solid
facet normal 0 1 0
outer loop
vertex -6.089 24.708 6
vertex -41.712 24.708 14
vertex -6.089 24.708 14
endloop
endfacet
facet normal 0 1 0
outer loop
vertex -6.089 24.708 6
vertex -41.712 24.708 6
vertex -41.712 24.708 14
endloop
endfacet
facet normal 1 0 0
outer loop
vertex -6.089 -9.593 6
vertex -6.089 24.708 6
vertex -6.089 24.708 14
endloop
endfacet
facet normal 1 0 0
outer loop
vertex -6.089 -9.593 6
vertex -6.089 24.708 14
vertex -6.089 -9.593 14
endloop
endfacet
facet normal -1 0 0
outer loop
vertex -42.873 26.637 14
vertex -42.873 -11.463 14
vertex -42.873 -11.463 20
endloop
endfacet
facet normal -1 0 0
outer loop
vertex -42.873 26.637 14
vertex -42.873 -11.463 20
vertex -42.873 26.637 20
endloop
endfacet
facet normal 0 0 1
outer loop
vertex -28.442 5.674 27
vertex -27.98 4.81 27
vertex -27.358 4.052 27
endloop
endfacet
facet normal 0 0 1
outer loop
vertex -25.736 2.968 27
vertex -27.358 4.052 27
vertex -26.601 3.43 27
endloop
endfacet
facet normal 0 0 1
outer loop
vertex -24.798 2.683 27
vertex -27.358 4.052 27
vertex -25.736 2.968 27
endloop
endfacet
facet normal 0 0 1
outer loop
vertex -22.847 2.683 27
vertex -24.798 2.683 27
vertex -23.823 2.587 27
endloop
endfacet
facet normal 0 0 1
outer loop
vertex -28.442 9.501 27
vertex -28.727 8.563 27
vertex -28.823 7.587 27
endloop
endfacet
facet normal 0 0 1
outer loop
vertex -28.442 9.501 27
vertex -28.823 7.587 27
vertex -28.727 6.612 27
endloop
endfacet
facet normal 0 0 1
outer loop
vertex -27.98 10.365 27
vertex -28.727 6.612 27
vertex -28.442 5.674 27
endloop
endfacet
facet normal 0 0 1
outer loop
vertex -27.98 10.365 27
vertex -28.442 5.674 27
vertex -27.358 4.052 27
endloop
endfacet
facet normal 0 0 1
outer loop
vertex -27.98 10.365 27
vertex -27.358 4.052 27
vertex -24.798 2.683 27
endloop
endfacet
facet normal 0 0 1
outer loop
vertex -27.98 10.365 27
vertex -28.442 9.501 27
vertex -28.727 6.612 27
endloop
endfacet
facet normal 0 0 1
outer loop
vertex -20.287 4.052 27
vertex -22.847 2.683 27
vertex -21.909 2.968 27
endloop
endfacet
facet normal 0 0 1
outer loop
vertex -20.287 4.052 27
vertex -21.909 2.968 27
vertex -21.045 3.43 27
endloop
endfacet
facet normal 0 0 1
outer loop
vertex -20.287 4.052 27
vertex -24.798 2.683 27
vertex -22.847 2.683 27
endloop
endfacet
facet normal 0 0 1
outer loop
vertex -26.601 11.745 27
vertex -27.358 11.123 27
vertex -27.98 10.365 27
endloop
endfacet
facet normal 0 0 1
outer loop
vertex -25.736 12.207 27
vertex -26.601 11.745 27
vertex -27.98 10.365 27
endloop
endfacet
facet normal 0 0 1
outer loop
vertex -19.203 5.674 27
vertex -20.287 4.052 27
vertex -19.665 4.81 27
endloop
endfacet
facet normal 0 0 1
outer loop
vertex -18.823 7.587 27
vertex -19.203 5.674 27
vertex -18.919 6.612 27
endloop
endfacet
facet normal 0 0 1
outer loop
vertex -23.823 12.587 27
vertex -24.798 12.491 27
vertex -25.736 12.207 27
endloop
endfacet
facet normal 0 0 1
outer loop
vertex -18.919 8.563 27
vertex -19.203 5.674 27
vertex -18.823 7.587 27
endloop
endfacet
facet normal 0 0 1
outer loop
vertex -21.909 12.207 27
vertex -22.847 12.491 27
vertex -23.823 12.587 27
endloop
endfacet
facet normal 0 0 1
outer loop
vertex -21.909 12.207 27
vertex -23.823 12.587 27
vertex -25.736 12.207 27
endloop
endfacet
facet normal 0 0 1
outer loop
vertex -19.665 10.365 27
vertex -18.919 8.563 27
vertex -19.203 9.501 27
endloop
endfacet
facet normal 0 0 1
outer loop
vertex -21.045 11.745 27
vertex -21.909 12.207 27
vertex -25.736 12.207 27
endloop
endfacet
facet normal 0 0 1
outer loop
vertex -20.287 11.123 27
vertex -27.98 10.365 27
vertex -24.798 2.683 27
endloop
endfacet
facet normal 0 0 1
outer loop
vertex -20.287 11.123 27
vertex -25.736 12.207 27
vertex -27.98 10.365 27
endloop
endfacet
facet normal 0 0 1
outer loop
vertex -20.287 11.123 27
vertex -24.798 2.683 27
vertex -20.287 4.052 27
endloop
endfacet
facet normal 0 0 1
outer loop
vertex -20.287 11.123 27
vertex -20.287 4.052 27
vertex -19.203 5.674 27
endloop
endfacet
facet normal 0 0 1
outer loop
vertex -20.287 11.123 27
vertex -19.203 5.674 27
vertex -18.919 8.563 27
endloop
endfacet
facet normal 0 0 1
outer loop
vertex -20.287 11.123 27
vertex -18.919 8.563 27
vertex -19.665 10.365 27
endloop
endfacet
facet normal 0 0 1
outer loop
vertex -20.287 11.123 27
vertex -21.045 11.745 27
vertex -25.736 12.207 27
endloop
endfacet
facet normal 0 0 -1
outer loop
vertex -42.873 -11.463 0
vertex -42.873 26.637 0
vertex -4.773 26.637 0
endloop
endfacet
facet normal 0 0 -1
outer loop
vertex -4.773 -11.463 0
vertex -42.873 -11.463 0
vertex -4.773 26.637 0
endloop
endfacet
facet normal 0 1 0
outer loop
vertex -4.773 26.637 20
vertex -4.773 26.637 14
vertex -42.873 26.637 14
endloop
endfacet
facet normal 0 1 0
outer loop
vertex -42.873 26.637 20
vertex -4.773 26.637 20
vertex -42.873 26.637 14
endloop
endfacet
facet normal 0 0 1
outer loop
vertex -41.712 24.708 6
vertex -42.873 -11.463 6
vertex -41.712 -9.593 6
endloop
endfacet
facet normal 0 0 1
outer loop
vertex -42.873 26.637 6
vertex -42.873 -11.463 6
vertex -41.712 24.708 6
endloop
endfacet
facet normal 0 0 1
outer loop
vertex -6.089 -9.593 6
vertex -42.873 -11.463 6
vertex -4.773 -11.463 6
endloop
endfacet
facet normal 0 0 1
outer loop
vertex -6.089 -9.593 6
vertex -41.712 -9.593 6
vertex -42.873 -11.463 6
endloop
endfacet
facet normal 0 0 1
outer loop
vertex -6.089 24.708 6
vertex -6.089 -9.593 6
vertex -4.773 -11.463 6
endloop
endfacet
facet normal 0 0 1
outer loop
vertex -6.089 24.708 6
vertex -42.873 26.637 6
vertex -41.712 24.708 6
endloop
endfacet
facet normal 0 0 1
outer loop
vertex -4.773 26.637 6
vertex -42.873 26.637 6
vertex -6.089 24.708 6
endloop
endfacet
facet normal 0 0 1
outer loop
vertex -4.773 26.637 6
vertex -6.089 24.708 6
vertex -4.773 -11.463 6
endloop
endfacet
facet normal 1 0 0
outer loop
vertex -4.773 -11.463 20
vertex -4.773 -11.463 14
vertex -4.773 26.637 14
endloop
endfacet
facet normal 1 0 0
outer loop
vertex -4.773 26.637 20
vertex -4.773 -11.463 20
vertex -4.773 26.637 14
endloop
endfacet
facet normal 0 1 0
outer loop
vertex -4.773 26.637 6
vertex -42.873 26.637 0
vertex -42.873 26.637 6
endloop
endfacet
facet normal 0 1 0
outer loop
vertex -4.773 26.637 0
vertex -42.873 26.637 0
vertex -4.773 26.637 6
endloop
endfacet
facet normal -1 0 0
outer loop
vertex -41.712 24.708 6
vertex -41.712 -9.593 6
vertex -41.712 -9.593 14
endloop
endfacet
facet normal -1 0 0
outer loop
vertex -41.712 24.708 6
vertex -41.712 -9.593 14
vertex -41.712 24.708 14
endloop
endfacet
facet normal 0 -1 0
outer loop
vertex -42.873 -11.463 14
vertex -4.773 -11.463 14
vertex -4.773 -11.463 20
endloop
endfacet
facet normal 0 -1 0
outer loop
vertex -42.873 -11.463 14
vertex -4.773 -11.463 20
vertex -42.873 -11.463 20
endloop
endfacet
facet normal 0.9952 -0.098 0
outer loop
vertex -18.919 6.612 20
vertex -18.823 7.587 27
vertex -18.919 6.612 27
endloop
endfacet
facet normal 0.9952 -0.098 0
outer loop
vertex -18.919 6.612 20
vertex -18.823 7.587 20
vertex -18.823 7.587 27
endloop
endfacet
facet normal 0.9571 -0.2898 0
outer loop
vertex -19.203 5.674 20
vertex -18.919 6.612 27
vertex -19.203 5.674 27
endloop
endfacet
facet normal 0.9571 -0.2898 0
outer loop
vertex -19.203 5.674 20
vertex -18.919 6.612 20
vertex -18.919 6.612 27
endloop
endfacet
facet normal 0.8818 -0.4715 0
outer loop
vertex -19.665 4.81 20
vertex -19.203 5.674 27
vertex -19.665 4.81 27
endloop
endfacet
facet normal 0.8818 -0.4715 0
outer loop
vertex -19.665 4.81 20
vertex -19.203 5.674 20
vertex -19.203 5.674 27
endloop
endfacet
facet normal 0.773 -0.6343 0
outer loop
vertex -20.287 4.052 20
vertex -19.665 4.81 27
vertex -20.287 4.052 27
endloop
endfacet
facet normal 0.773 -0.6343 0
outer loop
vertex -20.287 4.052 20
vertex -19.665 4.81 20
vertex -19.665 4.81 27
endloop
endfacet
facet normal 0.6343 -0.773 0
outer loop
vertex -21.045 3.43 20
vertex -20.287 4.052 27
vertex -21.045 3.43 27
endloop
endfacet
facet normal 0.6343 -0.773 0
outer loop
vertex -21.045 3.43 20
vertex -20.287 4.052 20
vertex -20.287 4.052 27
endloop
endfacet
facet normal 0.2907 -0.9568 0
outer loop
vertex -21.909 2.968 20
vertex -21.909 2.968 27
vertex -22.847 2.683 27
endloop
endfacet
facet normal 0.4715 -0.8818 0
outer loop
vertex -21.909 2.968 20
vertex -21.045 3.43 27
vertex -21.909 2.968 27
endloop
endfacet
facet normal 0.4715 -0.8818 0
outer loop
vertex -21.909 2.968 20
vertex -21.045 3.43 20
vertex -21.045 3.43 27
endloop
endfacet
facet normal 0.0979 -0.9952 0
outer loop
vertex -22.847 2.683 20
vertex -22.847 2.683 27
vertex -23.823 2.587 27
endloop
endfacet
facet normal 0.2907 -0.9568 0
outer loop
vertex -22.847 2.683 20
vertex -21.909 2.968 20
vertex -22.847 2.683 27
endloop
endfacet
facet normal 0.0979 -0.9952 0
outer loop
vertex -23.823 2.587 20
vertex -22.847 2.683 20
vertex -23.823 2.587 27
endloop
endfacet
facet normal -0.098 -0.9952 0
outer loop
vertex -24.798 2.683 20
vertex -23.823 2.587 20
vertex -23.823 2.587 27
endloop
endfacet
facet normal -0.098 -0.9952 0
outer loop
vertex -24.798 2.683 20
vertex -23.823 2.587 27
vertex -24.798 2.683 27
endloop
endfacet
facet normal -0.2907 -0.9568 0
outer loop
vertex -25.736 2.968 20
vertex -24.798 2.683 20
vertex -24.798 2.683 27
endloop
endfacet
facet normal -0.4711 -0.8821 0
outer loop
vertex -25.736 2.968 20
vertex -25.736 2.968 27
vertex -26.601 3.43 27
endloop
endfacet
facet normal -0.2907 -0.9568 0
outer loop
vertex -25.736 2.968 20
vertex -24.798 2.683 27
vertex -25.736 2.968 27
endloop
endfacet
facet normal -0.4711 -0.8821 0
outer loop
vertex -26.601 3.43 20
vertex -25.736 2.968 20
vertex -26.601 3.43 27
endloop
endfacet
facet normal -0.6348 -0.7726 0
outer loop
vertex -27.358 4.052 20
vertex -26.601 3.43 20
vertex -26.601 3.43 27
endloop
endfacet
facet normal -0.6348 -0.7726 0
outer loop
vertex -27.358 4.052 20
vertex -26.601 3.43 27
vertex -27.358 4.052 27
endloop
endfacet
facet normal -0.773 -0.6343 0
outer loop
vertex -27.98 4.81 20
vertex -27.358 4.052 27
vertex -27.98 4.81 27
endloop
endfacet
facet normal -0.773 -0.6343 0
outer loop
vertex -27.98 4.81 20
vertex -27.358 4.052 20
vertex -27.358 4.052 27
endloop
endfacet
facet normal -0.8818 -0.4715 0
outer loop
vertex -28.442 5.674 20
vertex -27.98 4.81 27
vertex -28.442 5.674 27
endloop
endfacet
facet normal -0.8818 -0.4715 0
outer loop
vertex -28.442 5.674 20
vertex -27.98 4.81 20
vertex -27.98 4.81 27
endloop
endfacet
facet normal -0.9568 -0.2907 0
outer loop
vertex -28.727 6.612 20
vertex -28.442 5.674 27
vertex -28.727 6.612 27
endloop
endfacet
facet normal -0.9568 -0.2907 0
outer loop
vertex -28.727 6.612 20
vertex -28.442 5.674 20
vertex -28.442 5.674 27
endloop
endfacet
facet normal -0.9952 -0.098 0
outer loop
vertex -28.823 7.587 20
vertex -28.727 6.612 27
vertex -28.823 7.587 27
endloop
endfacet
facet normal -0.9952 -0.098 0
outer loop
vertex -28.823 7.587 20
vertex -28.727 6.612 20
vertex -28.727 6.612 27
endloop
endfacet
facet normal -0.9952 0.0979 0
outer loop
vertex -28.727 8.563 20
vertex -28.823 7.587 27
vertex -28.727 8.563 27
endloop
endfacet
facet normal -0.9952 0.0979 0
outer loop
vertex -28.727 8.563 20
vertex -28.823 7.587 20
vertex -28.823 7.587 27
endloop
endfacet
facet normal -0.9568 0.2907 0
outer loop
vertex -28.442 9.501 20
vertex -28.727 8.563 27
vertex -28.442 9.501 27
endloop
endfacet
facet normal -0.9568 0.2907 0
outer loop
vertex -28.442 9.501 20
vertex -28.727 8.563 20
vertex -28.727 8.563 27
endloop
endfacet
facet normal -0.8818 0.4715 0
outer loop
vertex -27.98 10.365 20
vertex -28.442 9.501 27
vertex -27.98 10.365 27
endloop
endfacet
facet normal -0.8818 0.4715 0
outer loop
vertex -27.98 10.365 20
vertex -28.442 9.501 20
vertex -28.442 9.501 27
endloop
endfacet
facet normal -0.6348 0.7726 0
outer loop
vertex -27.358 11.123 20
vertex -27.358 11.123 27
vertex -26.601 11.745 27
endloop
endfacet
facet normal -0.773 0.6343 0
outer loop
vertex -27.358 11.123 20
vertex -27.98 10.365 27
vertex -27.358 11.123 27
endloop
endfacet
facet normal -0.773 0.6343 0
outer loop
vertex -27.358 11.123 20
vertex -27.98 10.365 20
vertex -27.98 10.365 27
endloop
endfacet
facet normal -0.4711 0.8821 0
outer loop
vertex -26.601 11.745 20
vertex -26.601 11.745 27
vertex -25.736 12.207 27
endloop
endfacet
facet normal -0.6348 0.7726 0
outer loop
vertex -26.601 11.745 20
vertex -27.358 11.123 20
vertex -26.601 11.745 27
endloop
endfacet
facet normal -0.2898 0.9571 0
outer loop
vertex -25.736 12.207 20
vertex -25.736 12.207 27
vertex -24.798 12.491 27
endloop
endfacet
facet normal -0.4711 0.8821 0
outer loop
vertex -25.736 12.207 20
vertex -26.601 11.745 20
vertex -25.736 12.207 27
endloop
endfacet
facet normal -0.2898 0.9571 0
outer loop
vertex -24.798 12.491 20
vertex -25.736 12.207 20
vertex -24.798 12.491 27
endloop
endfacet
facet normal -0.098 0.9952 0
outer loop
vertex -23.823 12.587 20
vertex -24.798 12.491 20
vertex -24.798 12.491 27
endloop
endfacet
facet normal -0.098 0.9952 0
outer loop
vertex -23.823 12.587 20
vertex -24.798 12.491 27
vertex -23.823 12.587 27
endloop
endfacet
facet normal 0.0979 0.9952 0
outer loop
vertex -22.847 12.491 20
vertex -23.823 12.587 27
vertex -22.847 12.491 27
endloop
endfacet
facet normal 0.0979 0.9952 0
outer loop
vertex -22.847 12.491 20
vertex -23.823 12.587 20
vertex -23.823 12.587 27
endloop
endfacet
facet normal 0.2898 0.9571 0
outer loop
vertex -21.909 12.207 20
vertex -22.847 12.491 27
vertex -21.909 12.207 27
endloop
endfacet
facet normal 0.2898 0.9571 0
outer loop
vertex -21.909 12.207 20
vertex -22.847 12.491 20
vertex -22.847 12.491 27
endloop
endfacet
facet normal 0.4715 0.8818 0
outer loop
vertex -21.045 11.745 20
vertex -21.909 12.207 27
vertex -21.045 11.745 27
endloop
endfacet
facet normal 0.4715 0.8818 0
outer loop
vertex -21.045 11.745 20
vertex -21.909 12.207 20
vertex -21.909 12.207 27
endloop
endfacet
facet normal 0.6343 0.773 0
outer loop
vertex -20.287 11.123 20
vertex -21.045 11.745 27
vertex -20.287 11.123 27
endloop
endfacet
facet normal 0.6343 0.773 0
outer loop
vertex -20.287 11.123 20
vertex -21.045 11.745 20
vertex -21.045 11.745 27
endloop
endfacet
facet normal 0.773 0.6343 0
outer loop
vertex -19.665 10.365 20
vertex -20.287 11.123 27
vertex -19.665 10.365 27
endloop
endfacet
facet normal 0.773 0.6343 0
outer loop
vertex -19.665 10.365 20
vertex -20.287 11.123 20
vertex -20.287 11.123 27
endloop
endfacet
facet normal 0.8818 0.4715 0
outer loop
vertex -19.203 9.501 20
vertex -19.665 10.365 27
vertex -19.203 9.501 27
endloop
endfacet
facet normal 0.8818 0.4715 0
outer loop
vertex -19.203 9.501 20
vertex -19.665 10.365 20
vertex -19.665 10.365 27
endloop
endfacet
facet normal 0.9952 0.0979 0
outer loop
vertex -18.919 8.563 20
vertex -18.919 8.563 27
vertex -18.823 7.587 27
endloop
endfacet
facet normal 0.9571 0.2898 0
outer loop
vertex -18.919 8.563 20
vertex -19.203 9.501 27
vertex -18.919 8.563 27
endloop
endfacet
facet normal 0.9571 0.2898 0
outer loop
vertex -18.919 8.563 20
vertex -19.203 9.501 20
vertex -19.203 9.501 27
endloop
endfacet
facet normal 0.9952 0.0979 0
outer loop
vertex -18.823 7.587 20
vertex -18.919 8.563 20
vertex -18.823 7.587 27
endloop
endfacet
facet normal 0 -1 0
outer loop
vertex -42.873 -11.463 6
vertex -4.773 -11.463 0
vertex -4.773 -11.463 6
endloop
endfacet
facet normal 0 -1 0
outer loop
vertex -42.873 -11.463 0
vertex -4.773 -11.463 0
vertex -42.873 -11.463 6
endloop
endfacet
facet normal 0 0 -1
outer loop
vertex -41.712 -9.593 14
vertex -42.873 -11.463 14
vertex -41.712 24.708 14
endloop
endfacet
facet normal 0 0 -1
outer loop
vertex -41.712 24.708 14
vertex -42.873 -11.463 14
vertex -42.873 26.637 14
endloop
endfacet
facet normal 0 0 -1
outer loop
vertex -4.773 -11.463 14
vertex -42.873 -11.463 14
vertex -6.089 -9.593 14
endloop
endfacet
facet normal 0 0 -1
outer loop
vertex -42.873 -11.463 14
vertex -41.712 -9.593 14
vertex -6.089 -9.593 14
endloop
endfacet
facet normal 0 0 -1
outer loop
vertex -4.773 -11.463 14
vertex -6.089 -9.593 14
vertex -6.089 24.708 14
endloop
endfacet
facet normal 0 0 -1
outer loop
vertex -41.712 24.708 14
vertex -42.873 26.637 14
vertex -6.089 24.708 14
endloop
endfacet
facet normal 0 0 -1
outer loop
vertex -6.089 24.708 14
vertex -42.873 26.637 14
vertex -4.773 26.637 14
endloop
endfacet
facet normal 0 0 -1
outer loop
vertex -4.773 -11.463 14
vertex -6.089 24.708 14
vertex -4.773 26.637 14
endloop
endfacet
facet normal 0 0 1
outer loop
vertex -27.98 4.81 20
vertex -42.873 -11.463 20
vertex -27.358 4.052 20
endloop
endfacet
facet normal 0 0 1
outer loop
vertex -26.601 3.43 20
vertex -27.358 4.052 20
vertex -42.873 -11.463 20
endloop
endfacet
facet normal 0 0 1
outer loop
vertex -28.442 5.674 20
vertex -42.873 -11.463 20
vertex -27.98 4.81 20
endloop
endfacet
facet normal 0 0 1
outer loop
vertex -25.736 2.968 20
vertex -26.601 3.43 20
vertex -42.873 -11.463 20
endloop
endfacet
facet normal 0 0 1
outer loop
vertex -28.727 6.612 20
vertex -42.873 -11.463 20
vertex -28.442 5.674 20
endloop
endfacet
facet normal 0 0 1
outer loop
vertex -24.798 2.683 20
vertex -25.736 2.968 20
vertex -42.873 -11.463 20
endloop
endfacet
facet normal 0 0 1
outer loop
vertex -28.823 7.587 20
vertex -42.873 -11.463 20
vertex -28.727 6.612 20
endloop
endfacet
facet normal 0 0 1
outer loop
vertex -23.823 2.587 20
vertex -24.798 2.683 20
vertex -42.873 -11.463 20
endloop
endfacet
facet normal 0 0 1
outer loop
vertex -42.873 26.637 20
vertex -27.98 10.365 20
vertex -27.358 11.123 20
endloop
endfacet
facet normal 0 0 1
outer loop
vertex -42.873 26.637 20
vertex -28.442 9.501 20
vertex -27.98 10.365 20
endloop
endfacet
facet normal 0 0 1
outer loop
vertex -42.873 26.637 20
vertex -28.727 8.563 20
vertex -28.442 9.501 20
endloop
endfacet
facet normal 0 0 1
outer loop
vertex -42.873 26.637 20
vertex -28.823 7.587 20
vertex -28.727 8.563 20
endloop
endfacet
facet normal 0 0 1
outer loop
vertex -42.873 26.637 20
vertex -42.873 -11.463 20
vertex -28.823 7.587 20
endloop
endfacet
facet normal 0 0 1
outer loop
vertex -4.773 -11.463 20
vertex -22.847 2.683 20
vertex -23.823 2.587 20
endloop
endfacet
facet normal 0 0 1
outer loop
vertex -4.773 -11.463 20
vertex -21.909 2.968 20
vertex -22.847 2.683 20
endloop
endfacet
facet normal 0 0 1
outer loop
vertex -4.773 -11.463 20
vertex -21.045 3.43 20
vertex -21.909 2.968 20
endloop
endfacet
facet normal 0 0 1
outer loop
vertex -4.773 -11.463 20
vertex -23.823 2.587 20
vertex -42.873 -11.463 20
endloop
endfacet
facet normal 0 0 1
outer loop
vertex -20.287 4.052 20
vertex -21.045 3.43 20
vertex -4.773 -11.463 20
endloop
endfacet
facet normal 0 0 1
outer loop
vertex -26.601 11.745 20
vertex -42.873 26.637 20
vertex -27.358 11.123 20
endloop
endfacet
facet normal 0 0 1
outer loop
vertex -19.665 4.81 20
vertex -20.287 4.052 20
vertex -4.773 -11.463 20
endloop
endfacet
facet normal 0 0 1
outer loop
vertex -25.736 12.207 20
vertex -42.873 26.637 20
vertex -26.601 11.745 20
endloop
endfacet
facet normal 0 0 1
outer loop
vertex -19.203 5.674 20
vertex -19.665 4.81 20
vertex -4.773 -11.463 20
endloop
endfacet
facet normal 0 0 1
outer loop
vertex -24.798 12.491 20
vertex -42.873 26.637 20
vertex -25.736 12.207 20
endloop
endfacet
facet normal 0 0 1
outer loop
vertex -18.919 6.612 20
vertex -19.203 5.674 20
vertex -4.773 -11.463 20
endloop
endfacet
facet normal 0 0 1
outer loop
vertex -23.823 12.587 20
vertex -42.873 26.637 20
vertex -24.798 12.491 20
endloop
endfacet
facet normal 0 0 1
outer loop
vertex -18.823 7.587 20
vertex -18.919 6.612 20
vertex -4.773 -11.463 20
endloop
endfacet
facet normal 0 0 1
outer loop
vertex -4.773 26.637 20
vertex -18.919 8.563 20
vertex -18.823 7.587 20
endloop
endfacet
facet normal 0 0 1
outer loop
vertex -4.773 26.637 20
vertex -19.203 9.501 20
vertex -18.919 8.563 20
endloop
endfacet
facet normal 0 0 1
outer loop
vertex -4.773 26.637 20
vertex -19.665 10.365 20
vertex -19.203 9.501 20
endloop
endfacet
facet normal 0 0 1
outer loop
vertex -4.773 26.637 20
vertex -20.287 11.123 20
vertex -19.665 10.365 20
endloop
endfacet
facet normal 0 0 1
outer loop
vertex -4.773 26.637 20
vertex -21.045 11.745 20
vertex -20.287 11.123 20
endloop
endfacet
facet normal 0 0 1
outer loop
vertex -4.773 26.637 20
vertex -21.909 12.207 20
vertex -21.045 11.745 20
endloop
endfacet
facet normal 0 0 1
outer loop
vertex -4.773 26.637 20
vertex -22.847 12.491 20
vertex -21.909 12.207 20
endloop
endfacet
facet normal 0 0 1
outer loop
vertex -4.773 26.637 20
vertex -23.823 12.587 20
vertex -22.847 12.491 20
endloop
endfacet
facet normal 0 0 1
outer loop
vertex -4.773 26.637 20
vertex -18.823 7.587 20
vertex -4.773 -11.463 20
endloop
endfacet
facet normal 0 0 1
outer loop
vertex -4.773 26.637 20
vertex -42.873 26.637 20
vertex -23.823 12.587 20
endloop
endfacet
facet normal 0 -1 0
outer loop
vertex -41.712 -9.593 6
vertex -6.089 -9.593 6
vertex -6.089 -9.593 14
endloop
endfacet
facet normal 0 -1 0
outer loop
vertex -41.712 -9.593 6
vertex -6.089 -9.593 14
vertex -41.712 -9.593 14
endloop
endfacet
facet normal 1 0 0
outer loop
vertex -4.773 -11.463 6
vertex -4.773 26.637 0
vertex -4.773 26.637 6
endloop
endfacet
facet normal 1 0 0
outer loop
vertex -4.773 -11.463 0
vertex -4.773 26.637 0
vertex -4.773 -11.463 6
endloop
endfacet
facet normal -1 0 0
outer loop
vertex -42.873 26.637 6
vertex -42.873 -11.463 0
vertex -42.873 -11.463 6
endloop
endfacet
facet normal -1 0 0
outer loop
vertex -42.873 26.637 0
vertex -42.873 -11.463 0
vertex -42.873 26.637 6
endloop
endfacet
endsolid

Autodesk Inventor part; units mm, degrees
ref_plane "YZ Plane" through (0, 0, 0) normal (1, 0, 0) x (0, 1, 0)
ref_plane "XZ Plane" through (0, 0, 0) normal (0, 1, 0) x (-1, 0, 0)
ref_plane "XY Plane" through (0, 0, 0) normal (0, 0, 1) x (1, 0, 0)
sketch "Sketch1" plane through (0, 0, 0) normal (0, 0, 1) x (1, 0, 0)
  line L0 (-42.8727, 26.6374) -> (-4.7727, 26.6374)
  line L1 (-4.7727, 26.6374) -> (-4.7727, -11.4626)
  line L2 (-4.7727, -11.4626) -> (-42.8727, -11.4626)
  line L3 (-42.8727, -11.4626) -> (-42.8727, 26.6374)
  point P0 (0, 0)
  dimension "d0" = 38.1
  dimension "d1" = 38.1
extrude "Extrusion1" add sketch "Sketch1" along normal blind 6
sketch "Sketch2" plane through (0, 0, 6) normal (0, 0, 1) x (1, 0, 0)
  line L0 (-41.7124, 24.7081) -> (-6.0889, 24.7081)
  line L1 (-6.0889, 24.7081) -> (-6.0889, -9.5927)
  line L2 (-6.0889, -9.5927) -> (-41.7124, -9.5927)
  line L3 (-41.7124, -9.5927) -> (-41.7124, 24.7081)
  point P0 (0, 0)
extrude "Extrusion2" add sketch "Sketch2" along normal blind 8
sketch "Sketch3" plane through (0, 0, 14) normal (0, 0, 1) x (1, 0, 0)
  line L0 (-4.7727, 26.6374) -> (-42.8727, 26.6374) projected
  line L1 (-4.7727, -11.4626) -> (-4.7727, 26.6374) projected
  line L2 (-42.8727, 26.6374) -> (-4.7727, 26.6374)
  line L3 (-4.7727, 26.6374) -> (-4.7727, -11.4626)
  line L4 (-4.7727, -11.4626) -> (-42.8727, -11.4626)
  line L5 (-42.8727, -11.4626) -> (-42.8727, 26.6374)
  point P0 (0, 0)
extrude "Extrusion3" add sketch "Sketch3" along normal blind 6
sketch "Sketch4" plane through (0, 0, 20) normal (0, 0, 1) x (1, 0, 0)
  circle A0 centre (-23.8227, 7.5874) radius 5
  line L0 (-4.7727, 26.6374) -> (-42.8727, 26.6374) projected
  line L1 (-4.7727, -11.4626) -> (-4.7727, 26.6374) projected
  point P0 (0, 0)
  dimension "d8" = 10
  dimension "d9" = 19.05
  dimension "d10" = 19.05
extrude "Extrusion4" add sketch "Sketch4" along normal blind 7
properties part number "rev motor"
